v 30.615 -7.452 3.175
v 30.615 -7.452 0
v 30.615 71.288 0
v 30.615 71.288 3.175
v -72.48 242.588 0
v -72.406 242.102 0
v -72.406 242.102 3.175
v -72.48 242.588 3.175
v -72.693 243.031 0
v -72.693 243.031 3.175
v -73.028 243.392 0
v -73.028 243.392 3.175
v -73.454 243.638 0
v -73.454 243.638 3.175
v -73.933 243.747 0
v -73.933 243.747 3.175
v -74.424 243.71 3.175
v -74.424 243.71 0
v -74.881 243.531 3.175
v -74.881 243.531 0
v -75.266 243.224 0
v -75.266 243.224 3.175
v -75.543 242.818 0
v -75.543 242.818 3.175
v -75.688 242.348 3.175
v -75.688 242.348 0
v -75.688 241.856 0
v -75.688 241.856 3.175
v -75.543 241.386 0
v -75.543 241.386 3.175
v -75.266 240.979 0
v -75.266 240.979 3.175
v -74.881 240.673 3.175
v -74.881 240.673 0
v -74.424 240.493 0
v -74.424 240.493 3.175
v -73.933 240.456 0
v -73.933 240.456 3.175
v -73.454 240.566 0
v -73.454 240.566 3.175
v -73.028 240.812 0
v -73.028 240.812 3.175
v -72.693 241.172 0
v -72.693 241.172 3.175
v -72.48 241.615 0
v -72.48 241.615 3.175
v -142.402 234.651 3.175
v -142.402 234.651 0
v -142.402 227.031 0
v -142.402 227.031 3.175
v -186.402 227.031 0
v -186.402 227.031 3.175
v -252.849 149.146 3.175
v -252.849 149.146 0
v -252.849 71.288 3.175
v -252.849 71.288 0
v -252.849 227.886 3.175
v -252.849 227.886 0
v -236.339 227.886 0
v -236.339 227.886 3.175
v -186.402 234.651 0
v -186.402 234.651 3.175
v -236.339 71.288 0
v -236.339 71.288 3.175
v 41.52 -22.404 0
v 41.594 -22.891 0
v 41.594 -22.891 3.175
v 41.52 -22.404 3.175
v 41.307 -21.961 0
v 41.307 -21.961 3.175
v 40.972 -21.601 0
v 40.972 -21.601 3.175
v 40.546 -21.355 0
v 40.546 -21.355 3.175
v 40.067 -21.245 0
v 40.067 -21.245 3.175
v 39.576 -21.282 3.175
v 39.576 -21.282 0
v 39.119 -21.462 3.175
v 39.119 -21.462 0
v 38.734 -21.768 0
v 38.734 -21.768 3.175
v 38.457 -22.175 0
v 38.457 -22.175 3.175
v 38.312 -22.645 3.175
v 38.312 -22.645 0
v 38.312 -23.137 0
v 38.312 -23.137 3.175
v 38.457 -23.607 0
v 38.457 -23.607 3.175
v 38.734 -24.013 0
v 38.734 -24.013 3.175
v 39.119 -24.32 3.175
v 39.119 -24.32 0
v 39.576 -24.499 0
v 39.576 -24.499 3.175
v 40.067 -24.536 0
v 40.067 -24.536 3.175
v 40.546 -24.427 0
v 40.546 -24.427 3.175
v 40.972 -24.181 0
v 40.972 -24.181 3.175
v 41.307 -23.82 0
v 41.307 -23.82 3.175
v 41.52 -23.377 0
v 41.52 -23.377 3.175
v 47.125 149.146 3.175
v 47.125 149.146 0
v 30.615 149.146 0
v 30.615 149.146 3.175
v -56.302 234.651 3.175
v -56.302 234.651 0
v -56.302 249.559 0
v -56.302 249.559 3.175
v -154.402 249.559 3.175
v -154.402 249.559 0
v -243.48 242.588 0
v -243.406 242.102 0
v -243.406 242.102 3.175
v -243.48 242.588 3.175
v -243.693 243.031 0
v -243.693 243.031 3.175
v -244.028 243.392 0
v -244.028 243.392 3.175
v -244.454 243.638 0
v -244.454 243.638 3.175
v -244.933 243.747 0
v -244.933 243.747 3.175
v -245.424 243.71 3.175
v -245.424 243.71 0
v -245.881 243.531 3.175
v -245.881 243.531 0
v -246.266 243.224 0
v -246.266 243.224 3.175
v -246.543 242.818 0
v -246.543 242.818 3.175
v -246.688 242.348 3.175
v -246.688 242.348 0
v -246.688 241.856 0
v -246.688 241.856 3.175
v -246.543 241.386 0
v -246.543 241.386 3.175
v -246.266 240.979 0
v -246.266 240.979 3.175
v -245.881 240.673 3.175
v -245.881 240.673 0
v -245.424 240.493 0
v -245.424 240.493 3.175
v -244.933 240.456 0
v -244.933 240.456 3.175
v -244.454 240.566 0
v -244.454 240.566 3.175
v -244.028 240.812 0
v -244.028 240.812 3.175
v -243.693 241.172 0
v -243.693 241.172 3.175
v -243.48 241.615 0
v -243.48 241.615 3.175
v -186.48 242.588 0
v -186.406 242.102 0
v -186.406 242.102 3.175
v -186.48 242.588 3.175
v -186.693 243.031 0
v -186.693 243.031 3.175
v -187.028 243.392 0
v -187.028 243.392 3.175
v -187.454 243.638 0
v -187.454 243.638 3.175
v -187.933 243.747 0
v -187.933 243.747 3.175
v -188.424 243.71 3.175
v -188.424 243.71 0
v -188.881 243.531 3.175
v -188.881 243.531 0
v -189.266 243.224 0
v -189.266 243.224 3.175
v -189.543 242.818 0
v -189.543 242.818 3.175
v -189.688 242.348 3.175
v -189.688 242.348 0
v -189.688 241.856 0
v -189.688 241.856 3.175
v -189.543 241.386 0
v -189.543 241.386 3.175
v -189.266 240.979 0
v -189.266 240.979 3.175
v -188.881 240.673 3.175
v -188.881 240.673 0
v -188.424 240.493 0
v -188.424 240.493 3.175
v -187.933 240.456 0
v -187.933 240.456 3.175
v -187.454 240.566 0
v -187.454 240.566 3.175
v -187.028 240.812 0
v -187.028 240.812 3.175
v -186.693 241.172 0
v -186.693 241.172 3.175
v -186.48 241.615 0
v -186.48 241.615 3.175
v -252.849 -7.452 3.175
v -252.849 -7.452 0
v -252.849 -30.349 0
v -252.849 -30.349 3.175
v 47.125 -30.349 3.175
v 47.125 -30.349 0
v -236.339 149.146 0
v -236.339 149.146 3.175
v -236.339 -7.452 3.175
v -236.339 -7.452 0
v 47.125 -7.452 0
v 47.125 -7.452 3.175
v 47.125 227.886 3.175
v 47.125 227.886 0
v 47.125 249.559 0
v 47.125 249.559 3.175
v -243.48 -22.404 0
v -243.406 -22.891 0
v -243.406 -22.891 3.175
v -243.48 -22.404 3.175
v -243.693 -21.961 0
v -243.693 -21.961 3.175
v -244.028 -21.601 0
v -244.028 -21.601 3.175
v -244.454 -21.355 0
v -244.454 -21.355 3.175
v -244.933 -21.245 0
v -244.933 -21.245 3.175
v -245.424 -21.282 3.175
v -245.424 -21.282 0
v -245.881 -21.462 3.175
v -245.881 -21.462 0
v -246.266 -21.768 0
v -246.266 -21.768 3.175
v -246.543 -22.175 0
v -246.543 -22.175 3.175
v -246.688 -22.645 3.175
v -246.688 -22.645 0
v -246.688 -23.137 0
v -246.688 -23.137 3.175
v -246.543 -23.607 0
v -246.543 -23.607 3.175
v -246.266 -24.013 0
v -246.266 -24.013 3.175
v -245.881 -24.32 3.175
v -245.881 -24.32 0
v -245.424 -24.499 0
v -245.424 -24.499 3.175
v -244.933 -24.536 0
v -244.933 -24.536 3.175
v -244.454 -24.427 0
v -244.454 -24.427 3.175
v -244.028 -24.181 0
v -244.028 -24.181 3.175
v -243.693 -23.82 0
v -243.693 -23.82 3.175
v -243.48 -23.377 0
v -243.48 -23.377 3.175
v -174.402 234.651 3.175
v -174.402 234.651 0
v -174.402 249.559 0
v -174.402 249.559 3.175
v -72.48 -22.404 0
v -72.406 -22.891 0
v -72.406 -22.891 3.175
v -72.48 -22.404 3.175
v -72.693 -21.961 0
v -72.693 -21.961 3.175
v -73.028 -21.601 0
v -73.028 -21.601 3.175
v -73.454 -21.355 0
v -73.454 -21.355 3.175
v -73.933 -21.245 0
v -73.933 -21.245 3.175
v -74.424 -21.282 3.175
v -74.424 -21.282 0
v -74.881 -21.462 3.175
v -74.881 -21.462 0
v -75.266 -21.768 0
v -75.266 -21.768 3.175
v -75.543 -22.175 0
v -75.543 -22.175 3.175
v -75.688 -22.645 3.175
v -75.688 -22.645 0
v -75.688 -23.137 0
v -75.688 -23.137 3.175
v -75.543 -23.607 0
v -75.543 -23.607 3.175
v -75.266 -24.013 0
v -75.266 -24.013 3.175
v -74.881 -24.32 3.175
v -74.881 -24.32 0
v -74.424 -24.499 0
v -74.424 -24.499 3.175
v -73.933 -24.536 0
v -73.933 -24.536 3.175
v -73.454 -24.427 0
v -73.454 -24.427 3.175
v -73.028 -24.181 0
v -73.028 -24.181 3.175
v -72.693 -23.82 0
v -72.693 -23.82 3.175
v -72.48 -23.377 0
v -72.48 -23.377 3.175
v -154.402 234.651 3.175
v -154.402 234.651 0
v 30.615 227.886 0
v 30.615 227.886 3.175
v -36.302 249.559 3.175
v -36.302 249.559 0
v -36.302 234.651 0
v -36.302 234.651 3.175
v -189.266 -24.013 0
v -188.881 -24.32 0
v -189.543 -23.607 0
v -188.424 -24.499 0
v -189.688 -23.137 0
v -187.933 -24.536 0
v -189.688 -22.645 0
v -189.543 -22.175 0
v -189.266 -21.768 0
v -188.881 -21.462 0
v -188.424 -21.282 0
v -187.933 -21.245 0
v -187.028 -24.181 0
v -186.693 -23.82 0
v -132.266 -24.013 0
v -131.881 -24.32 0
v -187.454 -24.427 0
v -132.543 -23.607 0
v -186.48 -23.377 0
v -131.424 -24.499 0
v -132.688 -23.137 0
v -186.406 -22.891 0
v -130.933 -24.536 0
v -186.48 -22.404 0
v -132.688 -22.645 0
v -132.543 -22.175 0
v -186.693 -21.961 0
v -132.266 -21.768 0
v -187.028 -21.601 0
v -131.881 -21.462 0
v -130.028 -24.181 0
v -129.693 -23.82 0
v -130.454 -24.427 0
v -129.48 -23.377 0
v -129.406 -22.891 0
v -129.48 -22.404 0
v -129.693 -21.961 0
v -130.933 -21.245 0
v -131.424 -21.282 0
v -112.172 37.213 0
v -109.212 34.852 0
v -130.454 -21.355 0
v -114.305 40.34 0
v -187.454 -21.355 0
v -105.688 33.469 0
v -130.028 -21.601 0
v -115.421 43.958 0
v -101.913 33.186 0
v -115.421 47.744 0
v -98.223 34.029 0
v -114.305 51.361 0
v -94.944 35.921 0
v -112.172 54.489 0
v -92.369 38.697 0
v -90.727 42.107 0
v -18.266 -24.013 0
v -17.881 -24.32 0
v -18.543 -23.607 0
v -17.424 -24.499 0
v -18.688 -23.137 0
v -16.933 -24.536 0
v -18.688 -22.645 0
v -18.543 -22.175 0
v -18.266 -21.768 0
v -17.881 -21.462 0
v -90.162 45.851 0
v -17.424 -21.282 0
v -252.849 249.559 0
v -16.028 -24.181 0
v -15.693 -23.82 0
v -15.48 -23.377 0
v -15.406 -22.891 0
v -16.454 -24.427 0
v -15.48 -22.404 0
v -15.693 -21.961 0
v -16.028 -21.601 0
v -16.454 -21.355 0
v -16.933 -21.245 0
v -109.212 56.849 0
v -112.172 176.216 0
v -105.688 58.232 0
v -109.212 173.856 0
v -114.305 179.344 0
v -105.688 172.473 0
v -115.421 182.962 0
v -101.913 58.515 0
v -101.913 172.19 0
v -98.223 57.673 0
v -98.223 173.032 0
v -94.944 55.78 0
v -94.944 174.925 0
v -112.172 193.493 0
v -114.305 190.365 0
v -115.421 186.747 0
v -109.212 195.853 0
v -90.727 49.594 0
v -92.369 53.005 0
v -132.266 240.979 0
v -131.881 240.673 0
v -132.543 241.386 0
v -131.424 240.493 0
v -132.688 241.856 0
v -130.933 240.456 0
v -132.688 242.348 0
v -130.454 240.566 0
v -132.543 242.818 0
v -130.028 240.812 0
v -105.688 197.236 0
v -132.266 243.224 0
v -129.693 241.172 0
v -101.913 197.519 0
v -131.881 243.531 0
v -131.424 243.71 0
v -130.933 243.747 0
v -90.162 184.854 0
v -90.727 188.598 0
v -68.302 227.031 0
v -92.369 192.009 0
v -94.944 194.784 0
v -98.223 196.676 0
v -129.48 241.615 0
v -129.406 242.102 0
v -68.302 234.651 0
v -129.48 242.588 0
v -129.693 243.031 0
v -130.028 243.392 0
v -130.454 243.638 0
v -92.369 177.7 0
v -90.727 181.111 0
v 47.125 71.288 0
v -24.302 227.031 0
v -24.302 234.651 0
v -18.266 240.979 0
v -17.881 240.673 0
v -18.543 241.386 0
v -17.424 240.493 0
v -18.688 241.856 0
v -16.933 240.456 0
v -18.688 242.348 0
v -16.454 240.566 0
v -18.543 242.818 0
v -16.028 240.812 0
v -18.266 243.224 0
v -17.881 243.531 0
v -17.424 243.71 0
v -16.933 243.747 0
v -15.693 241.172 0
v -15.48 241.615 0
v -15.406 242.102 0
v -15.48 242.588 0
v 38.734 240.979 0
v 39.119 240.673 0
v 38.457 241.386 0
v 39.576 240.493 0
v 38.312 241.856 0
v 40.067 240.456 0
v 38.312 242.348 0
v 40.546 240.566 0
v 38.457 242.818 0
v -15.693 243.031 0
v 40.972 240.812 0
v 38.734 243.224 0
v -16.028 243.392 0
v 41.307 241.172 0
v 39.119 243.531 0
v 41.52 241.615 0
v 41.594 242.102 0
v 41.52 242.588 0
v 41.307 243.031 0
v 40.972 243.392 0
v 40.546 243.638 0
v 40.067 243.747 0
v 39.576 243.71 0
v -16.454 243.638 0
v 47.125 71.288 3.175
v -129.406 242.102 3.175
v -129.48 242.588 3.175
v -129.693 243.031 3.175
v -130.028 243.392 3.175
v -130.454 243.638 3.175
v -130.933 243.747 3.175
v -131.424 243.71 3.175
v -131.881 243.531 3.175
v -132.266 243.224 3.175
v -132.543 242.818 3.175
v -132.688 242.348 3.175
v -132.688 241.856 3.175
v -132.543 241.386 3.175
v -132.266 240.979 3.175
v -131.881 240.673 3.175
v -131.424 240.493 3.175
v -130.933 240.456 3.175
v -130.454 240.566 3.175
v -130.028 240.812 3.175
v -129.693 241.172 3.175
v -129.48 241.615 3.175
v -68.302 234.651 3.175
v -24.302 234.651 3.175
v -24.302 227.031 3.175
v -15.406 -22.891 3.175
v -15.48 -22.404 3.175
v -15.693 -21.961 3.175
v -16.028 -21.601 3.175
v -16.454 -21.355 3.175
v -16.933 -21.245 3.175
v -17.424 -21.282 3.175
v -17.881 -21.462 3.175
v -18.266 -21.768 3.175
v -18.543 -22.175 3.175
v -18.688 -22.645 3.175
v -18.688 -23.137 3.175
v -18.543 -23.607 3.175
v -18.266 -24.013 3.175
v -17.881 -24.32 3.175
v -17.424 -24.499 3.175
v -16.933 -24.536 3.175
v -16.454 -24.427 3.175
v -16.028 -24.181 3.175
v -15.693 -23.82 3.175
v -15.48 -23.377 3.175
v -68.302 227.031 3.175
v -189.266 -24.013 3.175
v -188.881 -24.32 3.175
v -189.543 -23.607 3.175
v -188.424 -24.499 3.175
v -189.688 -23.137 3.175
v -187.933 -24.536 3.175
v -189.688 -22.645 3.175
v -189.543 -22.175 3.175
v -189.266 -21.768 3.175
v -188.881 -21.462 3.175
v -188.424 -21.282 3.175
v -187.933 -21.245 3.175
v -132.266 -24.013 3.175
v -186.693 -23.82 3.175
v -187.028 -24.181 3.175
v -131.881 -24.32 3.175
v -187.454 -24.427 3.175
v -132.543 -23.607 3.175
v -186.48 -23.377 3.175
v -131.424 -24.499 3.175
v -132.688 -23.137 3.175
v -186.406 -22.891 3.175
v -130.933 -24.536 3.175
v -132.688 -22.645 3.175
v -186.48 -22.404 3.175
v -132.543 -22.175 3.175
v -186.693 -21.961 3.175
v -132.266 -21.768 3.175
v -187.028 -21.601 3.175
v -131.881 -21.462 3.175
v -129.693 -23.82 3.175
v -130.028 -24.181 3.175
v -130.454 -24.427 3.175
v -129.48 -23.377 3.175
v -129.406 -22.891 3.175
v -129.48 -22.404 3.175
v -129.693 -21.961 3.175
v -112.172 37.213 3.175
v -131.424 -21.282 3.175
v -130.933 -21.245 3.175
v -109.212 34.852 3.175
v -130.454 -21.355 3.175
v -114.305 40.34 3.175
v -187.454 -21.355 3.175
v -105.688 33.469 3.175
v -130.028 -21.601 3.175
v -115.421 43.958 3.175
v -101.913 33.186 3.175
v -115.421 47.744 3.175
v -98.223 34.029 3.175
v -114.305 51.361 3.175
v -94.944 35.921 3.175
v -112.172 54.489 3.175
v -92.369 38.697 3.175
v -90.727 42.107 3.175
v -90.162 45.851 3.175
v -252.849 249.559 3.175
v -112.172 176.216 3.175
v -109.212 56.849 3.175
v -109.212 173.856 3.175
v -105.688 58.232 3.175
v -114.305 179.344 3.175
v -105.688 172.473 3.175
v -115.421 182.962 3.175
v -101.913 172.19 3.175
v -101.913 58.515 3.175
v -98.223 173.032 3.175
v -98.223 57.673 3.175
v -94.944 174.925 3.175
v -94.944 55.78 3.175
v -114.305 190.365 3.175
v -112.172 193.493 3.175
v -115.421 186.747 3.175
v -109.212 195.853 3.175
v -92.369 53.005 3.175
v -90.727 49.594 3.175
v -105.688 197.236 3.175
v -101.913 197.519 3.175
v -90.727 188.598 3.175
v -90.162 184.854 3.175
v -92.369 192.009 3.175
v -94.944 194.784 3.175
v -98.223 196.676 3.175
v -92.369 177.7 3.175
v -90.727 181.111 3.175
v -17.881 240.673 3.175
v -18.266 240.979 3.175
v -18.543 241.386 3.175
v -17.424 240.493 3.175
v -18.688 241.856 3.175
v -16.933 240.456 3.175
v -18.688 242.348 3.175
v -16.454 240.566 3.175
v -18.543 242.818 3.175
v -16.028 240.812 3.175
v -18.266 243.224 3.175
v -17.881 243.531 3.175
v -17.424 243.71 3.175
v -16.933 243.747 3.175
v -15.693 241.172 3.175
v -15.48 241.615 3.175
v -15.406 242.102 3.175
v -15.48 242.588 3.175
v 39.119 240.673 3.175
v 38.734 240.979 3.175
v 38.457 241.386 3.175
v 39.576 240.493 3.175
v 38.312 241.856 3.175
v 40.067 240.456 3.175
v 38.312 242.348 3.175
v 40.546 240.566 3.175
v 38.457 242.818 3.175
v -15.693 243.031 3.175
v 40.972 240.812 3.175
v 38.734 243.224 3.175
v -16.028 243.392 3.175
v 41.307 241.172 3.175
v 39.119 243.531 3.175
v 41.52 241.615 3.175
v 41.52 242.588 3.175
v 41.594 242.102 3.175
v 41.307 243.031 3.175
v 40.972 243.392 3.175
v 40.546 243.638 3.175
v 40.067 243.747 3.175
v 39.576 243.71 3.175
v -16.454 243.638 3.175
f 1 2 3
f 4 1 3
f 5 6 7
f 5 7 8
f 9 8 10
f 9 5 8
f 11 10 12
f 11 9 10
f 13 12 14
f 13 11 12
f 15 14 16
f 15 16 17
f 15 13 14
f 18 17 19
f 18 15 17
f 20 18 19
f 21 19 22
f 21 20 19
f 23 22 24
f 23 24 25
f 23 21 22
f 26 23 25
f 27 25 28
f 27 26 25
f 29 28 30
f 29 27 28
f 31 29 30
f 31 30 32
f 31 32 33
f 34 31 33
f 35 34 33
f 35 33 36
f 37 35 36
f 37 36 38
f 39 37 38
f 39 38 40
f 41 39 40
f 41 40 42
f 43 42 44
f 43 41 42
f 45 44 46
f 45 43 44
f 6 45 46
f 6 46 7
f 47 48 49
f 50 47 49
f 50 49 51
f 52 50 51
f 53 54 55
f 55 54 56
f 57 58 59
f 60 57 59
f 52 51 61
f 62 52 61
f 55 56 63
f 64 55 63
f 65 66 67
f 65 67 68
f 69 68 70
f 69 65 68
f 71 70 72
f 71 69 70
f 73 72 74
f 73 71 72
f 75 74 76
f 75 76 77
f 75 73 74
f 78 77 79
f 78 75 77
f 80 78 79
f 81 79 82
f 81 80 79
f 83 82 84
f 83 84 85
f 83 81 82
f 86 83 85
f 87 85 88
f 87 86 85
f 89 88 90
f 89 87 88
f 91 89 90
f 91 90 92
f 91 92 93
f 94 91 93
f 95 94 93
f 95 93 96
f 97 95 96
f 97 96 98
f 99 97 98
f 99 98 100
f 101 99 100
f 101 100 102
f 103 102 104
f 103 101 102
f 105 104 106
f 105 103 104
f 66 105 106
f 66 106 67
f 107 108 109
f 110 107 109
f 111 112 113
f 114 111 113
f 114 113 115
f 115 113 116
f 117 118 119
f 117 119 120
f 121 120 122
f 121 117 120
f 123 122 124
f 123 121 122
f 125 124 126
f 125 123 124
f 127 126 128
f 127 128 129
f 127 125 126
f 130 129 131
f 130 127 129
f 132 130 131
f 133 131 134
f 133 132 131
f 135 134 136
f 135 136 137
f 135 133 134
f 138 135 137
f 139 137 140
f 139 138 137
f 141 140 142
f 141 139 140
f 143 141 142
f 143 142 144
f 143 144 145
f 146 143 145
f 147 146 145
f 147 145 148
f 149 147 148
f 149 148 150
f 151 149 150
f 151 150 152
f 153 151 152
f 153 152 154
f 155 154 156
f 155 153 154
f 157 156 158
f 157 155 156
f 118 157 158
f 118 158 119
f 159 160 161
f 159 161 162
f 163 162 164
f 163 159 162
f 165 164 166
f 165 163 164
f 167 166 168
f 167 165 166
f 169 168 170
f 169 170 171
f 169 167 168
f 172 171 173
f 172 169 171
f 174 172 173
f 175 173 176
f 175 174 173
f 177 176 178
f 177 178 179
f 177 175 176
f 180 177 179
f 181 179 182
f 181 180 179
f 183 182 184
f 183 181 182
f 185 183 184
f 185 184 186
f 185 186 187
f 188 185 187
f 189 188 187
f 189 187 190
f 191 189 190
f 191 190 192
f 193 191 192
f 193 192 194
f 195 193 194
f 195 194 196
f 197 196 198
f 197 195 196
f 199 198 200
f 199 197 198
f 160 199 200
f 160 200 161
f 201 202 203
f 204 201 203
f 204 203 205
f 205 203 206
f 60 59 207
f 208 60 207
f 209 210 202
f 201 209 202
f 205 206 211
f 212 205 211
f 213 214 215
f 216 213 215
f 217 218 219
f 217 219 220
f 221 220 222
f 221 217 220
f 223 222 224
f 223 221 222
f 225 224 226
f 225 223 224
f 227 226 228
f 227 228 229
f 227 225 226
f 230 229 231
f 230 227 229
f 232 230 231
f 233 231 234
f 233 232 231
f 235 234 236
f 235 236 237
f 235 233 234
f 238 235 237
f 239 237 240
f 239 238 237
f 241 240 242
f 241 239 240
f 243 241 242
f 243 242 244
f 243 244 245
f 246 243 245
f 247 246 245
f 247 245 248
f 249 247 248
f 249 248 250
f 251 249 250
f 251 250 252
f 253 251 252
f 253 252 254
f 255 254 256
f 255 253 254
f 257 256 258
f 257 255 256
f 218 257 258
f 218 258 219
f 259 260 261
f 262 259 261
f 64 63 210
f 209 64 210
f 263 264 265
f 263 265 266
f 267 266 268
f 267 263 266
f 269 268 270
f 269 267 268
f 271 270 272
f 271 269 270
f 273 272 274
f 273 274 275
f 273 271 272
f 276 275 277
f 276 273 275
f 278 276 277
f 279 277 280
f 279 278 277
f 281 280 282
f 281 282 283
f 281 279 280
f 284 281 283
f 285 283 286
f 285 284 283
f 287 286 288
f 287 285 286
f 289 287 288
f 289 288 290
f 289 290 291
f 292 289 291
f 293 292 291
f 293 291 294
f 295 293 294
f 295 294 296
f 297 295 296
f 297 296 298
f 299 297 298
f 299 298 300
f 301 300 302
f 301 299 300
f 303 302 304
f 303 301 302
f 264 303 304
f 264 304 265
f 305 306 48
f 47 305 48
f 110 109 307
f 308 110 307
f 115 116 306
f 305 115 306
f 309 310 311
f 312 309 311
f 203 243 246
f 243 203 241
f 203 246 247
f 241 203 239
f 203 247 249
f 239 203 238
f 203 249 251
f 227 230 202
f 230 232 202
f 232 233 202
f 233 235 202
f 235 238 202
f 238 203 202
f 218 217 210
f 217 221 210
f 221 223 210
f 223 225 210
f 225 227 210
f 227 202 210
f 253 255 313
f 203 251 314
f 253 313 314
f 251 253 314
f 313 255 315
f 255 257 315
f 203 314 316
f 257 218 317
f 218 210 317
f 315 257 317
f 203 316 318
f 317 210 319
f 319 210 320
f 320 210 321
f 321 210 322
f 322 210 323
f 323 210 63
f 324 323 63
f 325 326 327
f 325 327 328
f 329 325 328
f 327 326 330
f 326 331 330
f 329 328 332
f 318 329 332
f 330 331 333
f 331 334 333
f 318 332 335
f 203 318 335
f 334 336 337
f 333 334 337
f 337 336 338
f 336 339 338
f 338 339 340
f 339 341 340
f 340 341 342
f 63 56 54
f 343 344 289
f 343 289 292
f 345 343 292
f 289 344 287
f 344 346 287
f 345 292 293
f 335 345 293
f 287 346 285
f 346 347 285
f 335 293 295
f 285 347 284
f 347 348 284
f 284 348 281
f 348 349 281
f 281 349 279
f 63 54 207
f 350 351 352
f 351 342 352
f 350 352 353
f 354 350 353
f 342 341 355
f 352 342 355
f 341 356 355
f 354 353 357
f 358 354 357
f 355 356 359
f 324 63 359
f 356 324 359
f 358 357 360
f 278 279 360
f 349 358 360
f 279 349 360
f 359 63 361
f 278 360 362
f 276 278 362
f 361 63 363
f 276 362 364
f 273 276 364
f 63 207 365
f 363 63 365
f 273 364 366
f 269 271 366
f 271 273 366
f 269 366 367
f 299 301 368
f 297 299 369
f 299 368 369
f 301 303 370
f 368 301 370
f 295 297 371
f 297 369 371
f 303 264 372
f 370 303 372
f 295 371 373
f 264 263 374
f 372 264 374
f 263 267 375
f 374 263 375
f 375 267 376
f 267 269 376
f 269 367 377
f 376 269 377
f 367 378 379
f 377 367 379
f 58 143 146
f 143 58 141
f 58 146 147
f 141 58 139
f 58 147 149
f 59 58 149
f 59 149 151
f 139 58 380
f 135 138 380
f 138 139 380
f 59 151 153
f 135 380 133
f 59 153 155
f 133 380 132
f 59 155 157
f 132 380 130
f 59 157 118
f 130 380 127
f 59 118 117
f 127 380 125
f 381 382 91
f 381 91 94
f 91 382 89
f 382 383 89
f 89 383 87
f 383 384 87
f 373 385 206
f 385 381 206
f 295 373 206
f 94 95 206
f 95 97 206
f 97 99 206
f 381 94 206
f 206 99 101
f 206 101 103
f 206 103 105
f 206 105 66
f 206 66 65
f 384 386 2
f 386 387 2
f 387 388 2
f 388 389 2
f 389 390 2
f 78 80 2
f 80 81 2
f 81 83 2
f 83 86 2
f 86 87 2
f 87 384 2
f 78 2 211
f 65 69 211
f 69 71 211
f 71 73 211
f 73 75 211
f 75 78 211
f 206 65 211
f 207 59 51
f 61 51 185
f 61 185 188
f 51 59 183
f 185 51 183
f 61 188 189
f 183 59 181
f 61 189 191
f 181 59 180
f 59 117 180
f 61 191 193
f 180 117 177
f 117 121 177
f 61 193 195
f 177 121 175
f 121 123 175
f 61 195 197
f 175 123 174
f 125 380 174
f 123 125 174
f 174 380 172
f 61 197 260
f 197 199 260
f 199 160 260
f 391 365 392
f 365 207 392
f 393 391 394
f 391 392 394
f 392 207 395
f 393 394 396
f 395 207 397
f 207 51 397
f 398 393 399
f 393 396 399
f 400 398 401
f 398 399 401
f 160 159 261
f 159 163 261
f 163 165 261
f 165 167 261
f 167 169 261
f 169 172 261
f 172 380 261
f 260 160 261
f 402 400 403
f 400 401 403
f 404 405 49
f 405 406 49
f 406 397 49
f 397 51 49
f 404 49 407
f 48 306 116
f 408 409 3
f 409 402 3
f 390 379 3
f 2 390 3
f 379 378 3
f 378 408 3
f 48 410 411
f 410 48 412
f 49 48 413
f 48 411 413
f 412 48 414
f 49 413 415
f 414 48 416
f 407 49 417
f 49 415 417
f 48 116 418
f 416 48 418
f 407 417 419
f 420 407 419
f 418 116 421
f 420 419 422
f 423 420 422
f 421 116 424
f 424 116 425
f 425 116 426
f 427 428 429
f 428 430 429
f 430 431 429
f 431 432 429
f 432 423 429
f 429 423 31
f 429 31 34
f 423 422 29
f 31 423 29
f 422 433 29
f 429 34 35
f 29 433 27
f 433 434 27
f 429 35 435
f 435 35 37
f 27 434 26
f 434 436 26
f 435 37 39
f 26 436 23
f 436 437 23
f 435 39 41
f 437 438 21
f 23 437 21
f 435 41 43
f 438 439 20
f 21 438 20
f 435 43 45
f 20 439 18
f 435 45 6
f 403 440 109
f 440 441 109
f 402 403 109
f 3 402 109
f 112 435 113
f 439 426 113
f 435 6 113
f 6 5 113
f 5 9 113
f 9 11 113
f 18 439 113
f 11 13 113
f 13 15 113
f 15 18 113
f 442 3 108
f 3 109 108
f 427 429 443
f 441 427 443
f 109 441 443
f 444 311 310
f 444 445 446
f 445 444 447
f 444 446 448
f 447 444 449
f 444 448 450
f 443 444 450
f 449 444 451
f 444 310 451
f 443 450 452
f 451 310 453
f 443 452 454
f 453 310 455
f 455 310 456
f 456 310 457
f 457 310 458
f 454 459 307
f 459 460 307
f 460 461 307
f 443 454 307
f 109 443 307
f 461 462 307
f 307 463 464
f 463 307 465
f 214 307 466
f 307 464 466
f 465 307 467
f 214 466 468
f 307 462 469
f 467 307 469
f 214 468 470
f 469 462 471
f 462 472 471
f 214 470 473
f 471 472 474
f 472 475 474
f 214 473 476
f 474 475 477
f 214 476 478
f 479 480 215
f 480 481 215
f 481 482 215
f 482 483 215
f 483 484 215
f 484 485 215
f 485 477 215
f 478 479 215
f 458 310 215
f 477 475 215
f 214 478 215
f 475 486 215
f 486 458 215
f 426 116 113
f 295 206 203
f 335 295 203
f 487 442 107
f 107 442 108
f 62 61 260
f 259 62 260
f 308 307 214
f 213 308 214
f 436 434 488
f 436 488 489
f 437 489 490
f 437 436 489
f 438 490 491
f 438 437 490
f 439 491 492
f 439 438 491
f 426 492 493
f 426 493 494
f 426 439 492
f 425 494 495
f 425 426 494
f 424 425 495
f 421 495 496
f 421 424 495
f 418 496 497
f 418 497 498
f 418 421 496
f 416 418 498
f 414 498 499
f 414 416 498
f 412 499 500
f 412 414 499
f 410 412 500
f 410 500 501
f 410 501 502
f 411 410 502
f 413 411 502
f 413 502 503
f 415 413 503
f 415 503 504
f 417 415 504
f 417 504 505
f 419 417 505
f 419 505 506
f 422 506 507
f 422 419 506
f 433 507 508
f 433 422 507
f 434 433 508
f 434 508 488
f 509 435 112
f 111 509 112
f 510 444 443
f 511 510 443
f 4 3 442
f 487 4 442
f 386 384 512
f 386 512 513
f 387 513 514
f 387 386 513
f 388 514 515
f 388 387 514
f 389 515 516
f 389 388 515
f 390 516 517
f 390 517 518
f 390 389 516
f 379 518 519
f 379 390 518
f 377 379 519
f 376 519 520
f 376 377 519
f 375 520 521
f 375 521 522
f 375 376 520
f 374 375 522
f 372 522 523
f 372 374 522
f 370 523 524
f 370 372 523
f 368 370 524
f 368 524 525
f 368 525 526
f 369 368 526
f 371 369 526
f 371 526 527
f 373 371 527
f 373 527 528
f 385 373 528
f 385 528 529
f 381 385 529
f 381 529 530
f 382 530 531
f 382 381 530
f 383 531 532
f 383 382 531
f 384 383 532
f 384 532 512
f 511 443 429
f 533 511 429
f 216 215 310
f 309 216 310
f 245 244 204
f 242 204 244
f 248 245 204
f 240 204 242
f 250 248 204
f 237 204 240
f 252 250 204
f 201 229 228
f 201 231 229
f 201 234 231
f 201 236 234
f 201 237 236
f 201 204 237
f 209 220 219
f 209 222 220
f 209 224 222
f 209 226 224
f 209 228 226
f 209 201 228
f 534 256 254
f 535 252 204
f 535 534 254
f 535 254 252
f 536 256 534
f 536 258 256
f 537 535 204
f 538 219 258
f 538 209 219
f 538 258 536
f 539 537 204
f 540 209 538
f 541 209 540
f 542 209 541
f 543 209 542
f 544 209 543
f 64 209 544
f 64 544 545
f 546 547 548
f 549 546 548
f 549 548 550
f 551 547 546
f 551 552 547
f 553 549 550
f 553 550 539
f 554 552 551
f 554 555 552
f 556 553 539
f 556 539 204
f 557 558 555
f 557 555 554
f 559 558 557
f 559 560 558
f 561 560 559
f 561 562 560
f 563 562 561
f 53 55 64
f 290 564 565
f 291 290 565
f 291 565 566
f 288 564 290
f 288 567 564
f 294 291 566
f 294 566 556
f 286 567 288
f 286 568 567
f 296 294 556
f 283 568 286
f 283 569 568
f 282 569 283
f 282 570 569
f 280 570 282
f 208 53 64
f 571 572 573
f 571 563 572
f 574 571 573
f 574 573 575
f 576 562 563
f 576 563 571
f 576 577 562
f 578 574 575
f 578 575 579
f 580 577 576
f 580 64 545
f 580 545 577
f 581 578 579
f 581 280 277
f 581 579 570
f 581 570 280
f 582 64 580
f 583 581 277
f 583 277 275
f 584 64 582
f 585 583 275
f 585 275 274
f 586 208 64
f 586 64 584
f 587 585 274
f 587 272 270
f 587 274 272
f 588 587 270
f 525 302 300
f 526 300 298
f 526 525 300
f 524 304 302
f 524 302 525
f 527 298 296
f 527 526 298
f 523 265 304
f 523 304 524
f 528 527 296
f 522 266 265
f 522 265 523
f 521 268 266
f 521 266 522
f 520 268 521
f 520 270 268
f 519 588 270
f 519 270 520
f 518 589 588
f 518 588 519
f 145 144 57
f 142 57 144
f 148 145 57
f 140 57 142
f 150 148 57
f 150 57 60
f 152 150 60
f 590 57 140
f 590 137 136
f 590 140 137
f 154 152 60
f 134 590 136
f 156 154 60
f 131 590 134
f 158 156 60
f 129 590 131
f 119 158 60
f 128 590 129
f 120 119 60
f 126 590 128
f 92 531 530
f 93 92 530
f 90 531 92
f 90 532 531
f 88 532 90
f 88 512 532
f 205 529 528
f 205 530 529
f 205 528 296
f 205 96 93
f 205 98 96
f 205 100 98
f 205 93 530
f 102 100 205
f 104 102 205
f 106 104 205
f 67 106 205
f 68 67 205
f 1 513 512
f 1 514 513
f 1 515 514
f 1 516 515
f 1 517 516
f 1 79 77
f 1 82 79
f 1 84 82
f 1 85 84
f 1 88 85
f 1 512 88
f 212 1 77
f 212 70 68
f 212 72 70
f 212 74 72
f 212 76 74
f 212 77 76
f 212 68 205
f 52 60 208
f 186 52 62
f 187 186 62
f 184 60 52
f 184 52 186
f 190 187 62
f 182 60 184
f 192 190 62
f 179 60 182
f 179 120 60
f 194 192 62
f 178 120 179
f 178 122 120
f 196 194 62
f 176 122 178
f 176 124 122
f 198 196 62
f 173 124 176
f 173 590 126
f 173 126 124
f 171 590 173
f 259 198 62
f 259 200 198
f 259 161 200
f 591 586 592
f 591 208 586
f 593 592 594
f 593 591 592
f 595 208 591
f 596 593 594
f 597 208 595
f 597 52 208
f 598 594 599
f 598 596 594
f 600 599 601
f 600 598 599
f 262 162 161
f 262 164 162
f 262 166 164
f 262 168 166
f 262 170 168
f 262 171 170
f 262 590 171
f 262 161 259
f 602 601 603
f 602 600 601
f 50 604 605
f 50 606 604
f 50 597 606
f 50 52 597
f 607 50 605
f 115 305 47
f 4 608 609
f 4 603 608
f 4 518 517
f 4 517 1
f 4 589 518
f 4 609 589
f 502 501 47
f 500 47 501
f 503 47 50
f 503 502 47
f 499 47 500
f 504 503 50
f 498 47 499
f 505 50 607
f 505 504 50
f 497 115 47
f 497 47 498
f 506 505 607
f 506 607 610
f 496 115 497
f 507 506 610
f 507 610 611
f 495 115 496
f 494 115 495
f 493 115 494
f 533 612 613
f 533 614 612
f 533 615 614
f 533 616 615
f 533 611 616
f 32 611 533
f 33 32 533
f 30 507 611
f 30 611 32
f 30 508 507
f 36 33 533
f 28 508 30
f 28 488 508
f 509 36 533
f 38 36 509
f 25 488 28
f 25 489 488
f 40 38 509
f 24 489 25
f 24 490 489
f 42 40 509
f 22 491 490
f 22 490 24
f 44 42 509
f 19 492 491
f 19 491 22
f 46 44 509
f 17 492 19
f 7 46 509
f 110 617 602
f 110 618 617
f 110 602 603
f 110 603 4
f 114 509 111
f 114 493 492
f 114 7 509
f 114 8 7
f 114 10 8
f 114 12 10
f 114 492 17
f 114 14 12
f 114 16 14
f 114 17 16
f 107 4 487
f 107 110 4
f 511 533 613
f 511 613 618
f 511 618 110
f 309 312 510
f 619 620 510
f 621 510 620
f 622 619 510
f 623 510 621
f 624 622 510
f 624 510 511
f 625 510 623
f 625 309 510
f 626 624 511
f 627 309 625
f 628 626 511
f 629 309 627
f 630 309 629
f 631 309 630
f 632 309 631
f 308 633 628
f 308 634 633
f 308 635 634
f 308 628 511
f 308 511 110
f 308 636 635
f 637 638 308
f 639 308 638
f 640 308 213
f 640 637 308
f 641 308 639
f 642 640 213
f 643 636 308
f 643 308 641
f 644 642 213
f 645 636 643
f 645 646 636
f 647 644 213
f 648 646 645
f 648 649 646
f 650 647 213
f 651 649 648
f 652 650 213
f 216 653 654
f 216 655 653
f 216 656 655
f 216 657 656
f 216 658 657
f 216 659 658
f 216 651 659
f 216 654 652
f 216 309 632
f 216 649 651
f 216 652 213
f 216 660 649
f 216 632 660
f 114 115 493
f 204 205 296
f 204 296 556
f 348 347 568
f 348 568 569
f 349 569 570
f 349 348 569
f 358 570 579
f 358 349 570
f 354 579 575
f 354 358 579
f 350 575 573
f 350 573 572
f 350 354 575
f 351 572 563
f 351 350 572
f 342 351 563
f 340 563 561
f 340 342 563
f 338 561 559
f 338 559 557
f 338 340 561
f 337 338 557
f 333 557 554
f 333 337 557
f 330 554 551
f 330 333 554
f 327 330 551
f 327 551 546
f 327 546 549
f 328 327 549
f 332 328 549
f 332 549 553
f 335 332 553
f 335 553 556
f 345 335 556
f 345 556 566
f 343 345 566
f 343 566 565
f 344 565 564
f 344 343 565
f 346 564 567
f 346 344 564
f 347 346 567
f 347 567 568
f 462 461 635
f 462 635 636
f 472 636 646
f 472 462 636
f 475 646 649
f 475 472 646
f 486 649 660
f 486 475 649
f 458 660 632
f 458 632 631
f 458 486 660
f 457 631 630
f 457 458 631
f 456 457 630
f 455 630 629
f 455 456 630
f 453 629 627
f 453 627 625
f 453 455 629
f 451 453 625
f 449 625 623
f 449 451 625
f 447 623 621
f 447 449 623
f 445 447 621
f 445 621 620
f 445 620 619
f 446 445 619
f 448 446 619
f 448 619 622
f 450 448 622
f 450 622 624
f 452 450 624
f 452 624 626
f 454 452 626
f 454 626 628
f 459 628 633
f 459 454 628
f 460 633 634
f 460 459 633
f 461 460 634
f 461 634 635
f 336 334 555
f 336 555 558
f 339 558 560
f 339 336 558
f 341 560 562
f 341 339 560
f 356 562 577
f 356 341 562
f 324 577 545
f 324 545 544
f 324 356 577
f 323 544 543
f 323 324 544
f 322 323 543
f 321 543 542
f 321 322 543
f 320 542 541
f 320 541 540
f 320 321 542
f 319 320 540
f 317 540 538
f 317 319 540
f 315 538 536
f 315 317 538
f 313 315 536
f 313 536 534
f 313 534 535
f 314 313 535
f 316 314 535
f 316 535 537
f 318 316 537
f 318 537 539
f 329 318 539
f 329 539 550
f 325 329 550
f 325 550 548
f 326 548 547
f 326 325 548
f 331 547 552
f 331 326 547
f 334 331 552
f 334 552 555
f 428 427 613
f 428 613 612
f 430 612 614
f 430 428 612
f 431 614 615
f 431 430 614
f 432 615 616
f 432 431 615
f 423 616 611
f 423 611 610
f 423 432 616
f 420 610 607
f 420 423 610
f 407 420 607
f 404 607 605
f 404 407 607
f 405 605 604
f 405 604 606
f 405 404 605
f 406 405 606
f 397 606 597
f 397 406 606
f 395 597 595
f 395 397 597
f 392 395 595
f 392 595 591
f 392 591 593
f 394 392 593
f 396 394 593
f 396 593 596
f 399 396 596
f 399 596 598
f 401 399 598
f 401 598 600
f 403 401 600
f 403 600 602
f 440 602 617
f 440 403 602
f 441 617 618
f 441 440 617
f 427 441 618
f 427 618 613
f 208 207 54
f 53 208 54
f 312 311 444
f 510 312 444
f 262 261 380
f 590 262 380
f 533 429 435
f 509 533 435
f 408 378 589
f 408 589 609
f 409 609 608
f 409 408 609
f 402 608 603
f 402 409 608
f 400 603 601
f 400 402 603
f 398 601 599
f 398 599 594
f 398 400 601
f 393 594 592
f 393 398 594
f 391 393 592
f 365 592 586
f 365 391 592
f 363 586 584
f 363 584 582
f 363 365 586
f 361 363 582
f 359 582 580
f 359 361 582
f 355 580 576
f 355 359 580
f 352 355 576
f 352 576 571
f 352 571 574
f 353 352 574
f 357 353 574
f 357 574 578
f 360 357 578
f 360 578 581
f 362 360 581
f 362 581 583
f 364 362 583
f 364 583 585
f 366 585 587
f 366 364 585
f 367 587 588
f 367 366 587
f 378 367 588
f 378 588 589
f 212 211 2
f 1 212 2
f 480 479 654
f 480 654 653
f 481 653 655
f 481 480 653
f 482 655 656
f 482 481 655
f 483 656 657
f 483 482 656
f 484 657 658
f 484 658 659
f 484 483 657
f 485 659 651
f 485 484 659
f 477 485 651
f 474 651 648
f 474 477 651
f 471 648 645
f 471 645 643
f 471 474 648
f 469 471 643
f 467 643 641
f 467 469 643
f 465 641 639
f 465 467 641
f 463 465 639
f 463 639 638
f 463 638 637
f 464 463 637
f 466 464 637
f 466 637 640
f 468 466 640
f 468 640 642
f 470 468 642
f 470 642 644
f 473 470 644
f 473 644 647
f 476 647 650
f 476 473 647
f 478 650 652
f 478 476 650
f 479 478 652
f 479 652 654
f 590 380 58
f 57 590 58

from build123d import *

# Parameters (mm, degrees)
SKETCH5_R           = 1.65
SKETCH5_R_2         = 12.7
BOSS_EXTRUDE1_DEPTH = 3.175


with BuildPart() as part:
    # Sketch5 → Boss-Extrude1 (new body)
    with BuildSketch(Plane.XY):
        Polygon((47.124604737, -7.452255775), (30.614604737, -7.452255775), (30.614604737, 71.287744225), (47.124604737, 71.287744225), (47.124604737, 149.14592508), (30.614604737, 149.14592508), (30.614604737, 227.88592508), (47.124604737, 227.88592508), (47.124604737, 249.558730102), (-36.302449898, 249.558730102), (-36.302449898, 234.650730102), (-24.302449898, 234.650730102), (-24.302449898, 227.030730102), (-36.302449898, 227.030730102), (-56.302449898, 227.030730102), (-68.302449898, 227.030730102), (-68.302449898, 234.650730102), (-56.302449898, 234.650730102), (-56.302449898, 249.558730102), (-154.402428268, 249.558730102), (-154.402428268, 234.650730102), (-142.402428268, 234.650730102), (-142.402428268, 227.030730102), (-154.402428268, 227.030730102), (-174.402428268, 227.030730102), (-186.402428268, 227.030730102), (-186.402428268, 234.650730102), (-174.402428268, 234.650730102), (-174.402428268, 249.558730102), (-252.849395263, 249.558730102), (-252.849395263, 227.88592508), (-236.339395263, 227.88592508), (-236.339395263, 149.14592508), (-252.849395263, 149.14592508), (-252.849395263, 71.287744225), (-236.339395263, 71.287744225), (-236.339395263, -7.452255775), (-252.849395263, -7.452255775), (-252.849395263, -30.349269898), (47.124604737, -30.349269898), align=None)
        with Locations((39.94351791, -22.890690042)):
            Circle(SKETCH5_R, mode=Mode.SUBTRACT)
        with Locations((-17.05648209, -22.890690042)):
            Circle(SKETCH5_R, mode=Mode.SUBTRACT)
        with Locations((-74.05648209, -22.890690042)):
            Circle(SKETCH5_R, mode=Mode.SUBTRACT)
        with Locations((-131.05648209, -22.890690042)):
            Circle(SKETCH5_R, mode=Mode.SUBTRACT)
        with Locations((-188.05648209, -22.890690042)):
            Circle(SKETCH5_R, mode=Mode.SUBTRACT)
        with Locations((-245.05648209, -22.890690042)):
            Circle(SKETCH5_R, mode=Mode.SUBTRACT)
        with Locations((39.94351791, 242.101620414)):
            Circle(SKETCH5_R, mode=Mode.SUBTRACT)
        with Locations((-17.05648209, 242.101620414)):
            Circle(SKETCH5_R, mode=Mode.SUBTRACT)
        with Locations((-74.05648209, 242.101620414)):
            Circle(SKETCH5_R, mode=Mode.SUBTRACT)
        with Locations((-131.05648209, 242.101620414)):
            Circle(SKETCH5_R, mode=Mode.SUBTRACT)
        with Locations((-188.05648209, 242.101620414)):
            Circle(SKETCH5_R, mode=Mode.SUBTRACT)
        with Locations((-245.05648209, 242.101620414)):
            Circle(SKETCH5_R, mode=Mode.SUBTRACT)
        with Locations((-102.862395263, 184.854342805)):
            Circle(SKETCH5_R_2, mode=Mode.SUBTRACT)
        with Locations((-102.862395263, 45.850730102)):
            Circle(SKETCH5_R_2, mode=Mode.SUBTRACT)
    extrude(amount=BOSS_EXTRUDE1_DEPTH)


solid = part.part
